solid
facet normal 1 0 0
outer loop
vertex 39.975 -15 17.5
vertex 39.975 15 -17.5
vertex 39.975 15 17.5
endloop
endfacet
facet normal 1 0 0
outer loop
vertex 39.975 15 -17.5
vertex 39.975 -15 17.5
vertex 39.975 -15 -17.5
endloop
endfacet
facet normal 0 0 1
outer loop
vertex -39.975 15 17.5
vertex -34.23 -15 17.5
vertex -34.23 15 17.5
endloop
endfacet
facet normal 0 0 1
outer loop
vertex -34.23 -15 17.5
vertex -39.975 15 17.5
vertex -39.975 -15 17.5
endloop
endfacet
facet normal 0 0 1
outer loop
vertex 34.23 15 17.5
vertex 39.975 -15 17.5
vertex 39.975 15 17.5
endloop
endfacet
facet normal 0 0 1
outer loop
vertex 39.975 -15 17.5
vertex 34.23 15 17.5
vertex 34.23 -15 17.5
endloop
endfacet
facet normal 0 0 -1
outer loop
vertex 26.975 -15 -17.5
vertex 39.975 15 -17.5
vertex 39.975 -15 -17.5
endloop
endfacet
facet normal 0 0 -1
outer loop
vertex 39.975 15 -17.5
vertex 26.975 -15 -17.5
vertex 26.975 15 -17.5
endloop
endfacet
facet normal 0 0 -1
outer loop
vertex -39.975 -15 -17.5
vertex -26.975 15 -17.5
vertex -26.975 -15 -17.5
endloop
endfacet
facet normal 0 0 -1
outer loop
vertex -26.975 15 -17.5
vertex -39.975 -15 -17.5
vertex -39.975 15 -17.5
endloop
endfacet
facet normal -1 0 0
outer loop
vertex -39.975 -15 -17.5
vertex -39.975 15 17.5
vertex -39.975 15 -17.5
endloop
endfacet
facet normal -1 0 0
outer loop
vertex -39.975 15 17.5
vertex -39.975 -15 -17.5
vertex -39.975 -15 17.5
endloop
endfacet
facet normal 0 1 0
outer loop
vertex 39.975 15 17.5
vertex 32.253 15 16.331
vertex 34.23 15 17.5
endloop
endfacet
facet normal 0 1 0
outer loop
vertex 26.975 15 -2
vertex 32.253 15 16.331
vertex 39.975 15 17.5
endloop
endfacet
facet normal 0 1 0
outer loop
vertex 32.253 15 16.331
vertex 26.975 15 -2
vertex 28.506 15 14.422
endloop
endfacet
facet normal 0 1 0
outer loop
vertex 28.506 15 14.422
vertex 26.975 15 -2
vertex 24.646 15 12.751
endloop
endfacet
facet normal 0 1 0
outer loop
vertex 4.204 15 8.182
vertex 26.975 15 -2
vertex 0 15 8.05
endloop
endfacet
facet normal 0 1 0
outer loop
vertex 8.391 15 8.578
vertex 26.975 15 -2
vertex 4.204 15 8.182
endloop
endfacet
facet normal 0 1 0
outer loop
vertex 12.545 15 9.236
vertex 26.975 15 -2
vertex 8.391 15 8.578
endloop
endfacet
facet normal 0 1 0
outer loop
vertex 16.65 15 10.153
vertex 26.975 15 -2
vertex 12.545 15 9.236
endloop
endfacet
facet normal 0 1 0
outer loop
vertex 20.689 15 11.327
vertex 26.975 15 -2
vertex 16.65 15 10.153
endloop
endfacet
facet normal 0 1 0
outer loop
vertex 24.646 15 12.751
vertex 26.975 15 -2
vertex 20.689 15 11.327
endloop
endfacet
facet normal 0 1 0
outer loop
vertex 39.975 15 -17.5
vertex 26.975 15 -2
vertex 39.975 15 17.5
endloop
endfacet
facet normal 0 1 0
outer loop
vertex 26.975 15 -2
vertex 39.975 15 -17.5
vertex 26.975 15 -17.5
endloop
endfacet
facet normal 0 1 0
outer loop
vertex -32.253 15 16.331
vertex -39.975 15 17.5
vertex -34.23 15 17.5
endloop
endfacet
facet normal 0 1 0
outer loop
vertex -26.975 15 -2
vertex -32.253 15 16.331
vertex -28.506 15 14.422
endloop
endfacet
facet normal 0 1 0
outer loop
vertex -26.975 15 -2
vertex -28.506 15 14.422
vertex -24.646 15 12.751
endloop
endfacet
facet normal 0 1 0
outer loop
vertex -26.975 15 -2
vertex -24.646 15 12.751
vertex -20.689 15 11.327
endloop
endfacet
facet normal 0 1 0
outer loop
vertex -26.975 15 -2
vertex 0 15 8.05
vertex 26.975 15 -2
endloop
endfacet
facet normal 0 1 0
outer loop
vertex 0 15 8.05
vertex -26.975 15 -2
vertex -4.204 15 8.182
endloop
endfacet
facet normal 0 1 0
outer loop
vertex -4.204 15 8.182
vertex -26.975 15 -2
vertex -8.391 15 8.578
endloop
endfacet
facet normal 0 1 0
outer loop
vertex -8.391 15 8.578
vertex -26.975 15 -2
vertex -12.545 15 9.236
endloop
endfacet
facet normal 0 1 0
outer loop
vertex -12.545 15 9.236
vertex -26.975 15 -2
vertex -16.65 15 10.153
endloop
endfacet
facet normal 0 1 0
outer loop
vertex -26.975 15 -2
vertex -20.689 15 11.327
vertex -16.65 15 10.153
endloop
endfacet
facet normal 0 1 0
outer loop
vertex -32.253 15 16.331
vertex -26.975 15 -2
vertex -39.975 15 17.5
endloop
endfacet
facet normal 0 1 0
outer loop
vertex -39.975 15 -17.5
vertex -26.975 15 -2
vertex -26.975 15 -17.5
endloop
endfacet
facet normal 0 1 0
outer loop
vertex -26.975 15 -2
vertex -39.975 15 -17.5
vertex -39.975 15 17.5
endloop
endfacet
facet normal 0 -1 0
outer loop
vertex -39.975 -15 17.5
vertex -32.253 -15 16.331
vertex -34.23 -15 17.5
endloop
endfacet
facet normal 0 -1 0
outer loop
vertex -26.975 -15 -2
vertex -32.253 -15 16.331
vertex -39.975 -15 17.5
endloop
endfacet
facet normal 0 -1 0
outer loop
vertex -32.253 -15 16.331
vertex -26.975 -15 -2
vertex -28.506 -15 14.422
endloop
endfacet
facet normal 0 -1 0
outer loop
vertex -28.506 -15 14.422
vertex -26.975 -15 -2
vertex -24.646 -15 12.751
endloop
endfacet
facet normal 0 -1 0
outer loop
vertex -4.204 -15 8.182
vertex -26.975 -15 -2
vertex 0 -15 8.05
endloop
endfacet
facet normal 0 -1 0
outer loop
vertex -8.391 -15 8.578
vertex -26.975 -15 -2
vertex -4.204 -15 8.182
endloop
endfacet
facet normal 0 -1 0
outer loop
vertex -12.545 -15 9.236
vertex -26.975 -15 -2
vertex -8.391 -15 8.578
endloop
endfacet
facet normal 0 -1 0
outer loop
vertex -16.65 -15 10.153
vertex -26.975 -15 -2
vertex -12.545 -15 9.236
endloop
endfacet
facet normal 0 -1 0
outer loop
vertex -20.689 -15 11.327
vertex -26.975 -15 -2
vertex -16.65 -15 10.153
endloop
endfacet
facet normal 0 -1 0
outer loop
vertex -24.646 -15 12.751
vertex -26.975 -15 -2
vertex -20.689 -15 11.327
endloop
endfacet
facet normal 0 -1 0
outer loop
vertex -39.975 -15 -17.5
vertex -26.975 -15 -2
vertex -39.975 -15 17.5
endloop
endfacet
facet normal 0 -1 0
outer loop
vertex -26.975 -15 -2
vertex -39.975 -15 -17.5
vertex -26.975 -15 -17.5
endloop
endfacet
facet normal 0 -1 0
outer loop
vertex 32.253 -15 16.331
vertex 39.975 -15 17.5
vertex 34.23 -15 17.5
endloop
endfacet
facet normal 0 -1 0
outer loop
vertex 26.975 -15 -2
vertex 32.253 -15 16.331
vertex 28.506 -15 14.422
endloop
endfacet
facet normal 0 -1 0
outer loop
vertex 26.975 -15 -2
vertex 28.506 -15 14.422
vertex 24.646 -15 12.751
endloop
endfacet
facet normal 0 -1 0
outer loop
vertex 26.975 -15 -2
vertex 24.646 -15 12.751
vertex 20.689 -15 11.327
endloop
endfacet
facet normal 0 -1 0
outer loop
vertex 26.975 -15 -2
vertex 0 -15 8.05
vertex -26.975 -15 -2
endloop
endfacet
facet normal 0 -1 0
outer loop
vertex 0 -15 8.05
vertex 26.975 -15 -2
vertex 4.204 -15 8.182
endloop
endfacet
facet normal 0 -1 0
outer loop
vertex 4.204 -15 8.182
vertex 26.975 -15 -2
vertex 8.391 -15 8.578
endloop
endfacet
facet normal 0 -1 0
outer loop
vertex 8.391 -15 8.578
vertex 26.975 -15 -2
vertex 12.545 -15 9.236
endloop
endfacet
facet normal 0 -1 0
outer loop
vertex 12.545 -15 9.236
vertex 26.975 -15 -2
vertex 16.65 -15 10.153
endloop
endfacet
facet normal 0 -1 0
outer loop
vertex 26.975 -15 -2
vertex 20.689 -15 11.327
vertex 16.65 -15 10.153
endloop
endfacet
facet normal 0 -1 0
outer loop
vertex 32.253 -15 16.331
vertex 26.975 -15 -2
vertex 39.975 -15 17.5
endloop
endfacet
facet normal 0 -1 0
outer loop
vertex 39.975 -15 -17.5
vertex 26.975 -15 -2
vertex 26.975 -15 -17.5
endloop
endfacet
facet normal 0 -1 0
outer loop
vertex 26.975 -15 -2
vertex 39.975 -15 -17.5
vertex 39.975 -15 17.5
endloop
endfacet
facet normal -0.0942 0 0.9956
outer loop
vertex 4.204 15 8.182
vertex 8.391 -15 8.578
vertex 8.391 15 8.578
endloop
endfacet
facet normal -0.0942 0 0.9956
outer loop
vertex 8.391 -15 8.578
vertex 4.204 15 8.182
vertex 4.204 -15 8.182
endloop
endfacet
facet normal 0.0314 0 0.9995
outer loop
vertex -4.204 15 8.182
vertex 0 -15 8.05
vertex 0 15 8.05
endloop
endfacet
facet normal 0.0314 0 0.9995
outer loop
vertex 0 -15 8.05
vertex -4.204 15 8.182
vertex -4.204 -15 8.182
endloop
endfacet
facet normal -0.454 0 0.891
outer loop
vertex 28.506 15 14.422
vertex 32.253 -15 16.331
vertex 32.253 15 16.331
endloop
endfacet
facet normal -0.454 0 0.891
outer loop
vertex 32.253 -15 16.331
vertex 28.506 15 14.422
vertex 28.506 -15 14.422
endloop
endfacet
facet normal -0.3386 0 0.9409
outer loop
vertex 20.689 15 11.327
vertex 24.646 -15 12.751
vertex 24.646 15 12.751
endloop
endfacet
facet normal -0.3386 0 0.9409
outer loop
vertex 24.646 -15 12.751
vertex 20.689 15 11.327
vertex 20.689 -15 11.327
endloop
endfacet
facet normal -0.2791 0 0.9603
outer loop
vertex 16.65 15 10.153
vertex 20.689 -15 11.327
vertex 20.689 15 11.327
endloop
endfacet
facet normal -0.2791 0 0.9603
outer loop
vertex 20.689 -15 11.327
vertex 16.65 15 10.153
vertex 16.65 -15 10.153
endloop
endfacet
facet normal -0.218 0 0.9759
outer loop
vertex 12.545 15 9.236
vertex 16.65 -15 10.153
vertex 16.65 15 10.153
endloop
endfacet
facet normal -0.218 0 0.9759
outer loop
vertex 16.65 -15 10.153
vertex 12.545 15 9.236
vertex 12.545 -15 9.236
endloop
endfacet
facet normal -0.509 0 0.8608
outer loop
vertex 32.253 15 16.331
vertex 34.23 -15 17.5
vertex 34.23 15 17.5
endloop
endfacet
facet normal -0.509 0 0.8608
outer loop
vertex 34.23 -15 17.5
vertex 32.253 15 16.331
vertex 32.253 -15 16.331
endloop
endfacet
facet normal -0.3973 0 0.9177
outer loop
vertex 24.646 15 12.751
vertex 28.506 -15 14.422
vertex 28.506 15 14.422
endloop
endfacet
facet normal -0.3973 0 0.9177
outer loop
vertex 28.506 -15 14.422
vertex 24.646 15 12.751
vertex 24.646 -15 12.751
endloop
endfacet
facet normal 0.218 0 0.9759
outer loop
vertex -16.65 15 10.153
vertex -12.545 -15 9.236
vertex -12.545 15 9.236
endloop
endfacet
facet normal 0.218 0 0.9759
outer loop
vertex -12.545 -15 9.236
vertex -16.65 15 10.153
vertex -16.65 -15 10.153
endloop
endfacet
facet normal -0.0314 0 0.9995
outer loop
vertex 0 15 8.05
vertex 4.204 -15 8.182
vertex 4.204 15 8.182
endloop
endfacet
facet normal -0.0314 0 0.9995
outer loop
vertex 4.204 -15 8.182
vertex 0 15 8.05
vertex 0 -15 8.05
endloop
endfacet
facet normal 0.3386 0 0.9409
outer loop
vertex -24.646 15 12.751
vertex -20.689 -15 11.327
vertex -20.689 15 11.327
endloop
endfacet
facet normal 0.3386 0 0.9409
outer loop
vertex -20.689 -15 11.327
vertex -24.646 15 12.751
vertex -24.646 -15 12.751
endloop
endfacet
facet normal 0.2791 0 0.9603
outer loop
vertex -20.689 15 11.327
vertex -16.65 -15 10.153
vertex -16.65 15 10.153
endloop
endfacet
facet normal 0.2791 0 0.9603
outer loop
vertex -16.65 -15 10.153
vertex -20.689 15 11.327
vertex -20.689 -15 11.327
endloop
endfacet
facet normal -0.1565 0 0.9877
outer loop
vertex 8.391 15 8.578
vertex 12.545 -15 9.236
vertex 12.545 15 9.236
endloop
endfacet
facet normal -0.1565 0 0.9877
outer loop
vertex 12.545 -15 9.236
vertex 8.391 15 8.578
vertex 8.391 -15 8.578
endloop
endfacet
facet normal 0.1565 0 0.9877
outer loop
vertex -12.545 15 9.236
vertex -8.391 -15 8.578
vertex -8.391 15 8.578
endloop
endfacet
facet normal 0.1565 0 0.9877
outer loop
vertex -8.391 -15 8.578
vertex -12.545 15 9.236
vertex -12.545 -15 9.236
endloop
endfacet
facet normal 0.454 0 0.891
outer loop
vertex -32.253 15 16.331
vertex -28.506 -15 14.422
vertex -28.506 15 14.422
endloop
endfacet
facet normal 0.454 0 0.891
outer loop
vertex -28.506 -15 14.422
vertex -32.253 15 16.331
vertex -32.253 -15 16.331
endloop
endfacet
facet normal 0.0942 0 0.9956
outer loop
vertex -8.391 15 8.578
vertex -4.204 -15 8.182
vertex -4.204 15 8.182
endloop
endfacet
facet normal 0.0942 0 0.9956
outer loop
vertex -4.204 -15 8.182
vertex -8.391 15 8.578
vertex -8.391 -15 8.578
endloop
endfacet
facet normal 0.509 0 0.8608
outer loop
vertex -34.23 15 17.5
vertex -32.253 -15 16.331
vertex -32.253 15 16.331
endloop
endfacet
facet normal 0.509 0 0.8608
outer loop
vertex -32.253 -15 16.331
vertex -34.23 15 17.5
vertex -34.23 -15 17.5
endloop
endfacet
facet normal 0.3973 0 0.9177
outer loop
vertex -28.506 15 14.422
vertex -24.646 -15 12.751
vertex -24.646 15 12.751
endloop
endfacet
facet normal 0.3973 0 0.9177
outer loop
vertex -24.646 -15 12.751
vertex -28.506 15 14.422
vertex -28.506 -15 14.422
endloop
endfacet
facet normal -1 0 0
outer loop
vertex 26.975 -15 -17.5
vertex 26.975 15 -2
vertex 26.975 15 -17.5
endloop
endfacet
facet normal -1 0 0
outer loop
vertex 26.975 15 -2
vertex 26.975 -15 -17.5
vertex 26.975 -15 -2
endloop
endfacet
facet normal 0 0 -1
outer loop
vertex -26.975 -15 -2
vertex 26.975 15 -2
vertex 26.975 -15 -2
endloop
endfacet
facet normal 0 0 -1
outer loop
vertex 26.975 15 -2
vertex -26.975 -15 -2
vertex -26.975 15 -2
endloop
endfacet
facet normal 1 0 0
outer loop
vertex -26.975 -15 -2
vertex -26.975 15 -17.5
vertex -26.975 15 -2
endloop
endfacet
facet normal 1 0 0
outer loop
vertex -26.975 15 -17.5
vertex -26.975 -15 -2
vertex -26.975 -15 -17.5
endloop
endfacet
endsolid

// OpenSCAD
$fn=100;

support_width = 130;
support_length = 50;
support_height = 25;

difference(){
cube([support_width*0.615,support_length*0.6,support_length*0.7],true);

translate([0,0,75])rotate([90,0,0])cylinder(h=support_length,r=support_width*0.515, center=true);
translate([0,0,-10])cube([support_width*0.415,support_length*0.62,support_length*0.32],true);
}
